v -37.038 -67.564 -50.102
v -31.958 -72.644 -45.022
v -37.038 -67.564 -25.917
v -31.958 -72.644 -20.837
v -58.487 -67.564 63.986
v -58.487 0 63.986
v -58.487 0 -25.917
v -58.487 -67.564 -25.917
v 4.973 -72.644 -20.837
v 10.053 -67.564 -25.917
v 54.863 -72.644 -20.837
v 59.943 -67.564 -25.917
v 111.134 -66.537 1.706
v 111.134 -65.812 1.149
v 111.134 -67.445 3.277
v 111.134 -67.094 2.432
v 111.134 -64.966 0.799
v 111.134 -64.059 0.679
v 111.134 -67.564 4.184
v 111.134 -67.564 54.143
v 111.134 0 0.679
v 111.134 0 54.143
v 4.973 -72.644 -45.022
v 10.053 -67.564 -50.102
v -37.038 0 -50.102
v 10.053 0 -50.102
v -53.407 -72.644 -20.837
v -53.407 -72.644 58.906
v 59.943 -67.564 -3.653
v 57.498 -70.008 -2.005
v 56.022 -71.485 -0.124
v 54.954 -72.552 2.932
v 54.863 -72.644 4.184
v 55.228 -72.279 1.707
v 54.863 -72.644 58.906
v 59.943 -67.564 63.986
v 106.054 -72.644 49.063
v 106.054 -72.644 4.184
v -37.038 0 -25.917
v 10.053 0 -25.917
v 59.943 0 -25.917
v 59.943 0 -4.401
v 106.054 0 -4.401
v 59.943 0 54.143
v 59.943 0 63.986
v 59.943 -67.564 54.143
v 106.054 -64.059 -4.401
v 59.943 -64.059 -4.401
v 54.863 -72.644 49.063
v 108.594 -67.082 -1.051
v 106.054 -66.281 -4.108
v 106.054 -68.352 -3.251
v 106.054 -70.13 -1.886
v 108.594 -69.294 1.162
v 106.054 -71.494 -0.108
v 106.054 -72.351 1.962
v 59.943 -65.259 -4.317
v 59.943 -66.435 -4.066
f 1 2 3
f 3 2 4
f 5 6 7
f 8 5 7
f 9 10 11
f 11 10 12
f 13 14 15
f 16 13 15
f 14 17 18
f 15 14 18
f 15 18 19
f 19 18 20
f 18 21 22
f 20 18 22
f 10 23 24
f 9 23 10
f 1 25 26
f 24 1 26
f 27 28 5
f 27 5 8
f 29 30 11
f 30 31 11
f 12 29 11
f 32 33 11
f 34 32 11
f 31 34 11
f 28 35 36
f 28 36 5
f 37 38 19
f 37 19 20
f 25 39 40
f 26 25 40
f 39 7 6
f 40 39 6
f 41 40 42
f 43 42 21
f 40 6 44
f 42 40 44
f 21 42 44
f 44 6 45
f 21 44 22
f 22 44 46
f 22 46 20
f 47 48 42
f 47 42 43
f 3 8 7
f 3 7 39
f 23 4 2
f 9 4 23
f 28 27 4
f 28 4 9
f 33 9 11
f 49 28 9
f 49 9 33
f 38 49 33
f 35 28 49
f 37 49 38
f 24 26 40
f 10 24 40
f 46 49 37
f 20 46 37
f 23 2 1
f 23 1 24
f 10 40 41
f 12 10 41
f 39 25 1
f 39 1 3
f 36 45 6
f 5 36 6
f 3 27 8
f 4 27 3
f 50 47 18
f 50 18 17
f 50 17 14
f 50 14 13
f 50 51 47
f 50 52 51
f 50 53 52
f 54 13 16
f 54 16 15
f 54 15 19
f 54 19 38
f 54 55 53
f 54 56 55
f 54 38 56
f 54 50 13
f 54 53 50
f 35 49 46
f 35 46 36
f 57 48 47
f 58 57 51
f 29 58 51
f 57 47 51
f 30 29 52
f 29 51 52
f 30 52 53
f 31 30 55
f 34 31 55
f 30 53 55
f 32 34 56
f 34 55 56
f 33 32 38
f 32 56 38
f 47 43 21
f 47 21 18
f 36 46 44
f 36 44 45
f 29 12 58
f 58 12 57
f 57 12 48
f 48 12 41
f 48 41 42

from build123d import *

# Parameters (mm, degrees)
F0_W     = 47.09104
F0_H     = 24.184491
F0_W_2   = 51.191684
F0_H_2   = 58.543412
F1_DEPTH = 72.644
F2_R     = 8.584943
F3_SIZE  = 5.08


with BuildPart() as f1:
    # F0 (on Front) → F1 (new body)
    with BuildSketch(Plane.XZ):
        with Locations((-13.492128, -38.009723)):
            Rectangle(F0_W, F0_H)
        Polygon((10.053392, -25.917478), (59.94251, -25.917478), (59.94251, -4.400743), (59.94251, 54.142669), (59.94251, 63.985944), (-58.487043, 63.985944), (-58.487043, -25.917478), (-37.037648, -25.917478), align=None)
        with Locations((85.538352, 24.870963)):
            Rectangle(F0_W_2, F0_H_2)
    extrude(amount=F1_DEPTH)

    # F2
    f2_edges = [f1.edges().sort_by_distance(p)[0] for p in [
        (85.538352, -72.644, -4.400743),
    ]]
    fillet(f2_edges, radius=F2_R)

    # F3
    f3_edges = [f1.edges().sort_by_distance(p)[0] for p in [
        (111.134194, -72.644, 29.163435),
        (85.538352, -72.644, 4.1842),
        (85.538352, -72.644, 54.142669),
        (59.94251, -72.644, -0.108271),
        (59.94251, -72.644, 59.064306),
        (59.94251, -72.644, -15.159111),
        (0.727734, -72.644, 63.985944),
        (34.997951, -72.644, -25.917478),
        (-58.487043, -72.644, 19.034233),
        (10.053392, -72.644, -38.009724),
        (-47.762346, -72.644, -25.917478),
        (-13.492128, -72.644, -50.101969),
        (-37.037648, -72.644, -38.009724),
    ]]
    chamfer(f3_edges, length=F3_SIZE)


solid = f1.part
